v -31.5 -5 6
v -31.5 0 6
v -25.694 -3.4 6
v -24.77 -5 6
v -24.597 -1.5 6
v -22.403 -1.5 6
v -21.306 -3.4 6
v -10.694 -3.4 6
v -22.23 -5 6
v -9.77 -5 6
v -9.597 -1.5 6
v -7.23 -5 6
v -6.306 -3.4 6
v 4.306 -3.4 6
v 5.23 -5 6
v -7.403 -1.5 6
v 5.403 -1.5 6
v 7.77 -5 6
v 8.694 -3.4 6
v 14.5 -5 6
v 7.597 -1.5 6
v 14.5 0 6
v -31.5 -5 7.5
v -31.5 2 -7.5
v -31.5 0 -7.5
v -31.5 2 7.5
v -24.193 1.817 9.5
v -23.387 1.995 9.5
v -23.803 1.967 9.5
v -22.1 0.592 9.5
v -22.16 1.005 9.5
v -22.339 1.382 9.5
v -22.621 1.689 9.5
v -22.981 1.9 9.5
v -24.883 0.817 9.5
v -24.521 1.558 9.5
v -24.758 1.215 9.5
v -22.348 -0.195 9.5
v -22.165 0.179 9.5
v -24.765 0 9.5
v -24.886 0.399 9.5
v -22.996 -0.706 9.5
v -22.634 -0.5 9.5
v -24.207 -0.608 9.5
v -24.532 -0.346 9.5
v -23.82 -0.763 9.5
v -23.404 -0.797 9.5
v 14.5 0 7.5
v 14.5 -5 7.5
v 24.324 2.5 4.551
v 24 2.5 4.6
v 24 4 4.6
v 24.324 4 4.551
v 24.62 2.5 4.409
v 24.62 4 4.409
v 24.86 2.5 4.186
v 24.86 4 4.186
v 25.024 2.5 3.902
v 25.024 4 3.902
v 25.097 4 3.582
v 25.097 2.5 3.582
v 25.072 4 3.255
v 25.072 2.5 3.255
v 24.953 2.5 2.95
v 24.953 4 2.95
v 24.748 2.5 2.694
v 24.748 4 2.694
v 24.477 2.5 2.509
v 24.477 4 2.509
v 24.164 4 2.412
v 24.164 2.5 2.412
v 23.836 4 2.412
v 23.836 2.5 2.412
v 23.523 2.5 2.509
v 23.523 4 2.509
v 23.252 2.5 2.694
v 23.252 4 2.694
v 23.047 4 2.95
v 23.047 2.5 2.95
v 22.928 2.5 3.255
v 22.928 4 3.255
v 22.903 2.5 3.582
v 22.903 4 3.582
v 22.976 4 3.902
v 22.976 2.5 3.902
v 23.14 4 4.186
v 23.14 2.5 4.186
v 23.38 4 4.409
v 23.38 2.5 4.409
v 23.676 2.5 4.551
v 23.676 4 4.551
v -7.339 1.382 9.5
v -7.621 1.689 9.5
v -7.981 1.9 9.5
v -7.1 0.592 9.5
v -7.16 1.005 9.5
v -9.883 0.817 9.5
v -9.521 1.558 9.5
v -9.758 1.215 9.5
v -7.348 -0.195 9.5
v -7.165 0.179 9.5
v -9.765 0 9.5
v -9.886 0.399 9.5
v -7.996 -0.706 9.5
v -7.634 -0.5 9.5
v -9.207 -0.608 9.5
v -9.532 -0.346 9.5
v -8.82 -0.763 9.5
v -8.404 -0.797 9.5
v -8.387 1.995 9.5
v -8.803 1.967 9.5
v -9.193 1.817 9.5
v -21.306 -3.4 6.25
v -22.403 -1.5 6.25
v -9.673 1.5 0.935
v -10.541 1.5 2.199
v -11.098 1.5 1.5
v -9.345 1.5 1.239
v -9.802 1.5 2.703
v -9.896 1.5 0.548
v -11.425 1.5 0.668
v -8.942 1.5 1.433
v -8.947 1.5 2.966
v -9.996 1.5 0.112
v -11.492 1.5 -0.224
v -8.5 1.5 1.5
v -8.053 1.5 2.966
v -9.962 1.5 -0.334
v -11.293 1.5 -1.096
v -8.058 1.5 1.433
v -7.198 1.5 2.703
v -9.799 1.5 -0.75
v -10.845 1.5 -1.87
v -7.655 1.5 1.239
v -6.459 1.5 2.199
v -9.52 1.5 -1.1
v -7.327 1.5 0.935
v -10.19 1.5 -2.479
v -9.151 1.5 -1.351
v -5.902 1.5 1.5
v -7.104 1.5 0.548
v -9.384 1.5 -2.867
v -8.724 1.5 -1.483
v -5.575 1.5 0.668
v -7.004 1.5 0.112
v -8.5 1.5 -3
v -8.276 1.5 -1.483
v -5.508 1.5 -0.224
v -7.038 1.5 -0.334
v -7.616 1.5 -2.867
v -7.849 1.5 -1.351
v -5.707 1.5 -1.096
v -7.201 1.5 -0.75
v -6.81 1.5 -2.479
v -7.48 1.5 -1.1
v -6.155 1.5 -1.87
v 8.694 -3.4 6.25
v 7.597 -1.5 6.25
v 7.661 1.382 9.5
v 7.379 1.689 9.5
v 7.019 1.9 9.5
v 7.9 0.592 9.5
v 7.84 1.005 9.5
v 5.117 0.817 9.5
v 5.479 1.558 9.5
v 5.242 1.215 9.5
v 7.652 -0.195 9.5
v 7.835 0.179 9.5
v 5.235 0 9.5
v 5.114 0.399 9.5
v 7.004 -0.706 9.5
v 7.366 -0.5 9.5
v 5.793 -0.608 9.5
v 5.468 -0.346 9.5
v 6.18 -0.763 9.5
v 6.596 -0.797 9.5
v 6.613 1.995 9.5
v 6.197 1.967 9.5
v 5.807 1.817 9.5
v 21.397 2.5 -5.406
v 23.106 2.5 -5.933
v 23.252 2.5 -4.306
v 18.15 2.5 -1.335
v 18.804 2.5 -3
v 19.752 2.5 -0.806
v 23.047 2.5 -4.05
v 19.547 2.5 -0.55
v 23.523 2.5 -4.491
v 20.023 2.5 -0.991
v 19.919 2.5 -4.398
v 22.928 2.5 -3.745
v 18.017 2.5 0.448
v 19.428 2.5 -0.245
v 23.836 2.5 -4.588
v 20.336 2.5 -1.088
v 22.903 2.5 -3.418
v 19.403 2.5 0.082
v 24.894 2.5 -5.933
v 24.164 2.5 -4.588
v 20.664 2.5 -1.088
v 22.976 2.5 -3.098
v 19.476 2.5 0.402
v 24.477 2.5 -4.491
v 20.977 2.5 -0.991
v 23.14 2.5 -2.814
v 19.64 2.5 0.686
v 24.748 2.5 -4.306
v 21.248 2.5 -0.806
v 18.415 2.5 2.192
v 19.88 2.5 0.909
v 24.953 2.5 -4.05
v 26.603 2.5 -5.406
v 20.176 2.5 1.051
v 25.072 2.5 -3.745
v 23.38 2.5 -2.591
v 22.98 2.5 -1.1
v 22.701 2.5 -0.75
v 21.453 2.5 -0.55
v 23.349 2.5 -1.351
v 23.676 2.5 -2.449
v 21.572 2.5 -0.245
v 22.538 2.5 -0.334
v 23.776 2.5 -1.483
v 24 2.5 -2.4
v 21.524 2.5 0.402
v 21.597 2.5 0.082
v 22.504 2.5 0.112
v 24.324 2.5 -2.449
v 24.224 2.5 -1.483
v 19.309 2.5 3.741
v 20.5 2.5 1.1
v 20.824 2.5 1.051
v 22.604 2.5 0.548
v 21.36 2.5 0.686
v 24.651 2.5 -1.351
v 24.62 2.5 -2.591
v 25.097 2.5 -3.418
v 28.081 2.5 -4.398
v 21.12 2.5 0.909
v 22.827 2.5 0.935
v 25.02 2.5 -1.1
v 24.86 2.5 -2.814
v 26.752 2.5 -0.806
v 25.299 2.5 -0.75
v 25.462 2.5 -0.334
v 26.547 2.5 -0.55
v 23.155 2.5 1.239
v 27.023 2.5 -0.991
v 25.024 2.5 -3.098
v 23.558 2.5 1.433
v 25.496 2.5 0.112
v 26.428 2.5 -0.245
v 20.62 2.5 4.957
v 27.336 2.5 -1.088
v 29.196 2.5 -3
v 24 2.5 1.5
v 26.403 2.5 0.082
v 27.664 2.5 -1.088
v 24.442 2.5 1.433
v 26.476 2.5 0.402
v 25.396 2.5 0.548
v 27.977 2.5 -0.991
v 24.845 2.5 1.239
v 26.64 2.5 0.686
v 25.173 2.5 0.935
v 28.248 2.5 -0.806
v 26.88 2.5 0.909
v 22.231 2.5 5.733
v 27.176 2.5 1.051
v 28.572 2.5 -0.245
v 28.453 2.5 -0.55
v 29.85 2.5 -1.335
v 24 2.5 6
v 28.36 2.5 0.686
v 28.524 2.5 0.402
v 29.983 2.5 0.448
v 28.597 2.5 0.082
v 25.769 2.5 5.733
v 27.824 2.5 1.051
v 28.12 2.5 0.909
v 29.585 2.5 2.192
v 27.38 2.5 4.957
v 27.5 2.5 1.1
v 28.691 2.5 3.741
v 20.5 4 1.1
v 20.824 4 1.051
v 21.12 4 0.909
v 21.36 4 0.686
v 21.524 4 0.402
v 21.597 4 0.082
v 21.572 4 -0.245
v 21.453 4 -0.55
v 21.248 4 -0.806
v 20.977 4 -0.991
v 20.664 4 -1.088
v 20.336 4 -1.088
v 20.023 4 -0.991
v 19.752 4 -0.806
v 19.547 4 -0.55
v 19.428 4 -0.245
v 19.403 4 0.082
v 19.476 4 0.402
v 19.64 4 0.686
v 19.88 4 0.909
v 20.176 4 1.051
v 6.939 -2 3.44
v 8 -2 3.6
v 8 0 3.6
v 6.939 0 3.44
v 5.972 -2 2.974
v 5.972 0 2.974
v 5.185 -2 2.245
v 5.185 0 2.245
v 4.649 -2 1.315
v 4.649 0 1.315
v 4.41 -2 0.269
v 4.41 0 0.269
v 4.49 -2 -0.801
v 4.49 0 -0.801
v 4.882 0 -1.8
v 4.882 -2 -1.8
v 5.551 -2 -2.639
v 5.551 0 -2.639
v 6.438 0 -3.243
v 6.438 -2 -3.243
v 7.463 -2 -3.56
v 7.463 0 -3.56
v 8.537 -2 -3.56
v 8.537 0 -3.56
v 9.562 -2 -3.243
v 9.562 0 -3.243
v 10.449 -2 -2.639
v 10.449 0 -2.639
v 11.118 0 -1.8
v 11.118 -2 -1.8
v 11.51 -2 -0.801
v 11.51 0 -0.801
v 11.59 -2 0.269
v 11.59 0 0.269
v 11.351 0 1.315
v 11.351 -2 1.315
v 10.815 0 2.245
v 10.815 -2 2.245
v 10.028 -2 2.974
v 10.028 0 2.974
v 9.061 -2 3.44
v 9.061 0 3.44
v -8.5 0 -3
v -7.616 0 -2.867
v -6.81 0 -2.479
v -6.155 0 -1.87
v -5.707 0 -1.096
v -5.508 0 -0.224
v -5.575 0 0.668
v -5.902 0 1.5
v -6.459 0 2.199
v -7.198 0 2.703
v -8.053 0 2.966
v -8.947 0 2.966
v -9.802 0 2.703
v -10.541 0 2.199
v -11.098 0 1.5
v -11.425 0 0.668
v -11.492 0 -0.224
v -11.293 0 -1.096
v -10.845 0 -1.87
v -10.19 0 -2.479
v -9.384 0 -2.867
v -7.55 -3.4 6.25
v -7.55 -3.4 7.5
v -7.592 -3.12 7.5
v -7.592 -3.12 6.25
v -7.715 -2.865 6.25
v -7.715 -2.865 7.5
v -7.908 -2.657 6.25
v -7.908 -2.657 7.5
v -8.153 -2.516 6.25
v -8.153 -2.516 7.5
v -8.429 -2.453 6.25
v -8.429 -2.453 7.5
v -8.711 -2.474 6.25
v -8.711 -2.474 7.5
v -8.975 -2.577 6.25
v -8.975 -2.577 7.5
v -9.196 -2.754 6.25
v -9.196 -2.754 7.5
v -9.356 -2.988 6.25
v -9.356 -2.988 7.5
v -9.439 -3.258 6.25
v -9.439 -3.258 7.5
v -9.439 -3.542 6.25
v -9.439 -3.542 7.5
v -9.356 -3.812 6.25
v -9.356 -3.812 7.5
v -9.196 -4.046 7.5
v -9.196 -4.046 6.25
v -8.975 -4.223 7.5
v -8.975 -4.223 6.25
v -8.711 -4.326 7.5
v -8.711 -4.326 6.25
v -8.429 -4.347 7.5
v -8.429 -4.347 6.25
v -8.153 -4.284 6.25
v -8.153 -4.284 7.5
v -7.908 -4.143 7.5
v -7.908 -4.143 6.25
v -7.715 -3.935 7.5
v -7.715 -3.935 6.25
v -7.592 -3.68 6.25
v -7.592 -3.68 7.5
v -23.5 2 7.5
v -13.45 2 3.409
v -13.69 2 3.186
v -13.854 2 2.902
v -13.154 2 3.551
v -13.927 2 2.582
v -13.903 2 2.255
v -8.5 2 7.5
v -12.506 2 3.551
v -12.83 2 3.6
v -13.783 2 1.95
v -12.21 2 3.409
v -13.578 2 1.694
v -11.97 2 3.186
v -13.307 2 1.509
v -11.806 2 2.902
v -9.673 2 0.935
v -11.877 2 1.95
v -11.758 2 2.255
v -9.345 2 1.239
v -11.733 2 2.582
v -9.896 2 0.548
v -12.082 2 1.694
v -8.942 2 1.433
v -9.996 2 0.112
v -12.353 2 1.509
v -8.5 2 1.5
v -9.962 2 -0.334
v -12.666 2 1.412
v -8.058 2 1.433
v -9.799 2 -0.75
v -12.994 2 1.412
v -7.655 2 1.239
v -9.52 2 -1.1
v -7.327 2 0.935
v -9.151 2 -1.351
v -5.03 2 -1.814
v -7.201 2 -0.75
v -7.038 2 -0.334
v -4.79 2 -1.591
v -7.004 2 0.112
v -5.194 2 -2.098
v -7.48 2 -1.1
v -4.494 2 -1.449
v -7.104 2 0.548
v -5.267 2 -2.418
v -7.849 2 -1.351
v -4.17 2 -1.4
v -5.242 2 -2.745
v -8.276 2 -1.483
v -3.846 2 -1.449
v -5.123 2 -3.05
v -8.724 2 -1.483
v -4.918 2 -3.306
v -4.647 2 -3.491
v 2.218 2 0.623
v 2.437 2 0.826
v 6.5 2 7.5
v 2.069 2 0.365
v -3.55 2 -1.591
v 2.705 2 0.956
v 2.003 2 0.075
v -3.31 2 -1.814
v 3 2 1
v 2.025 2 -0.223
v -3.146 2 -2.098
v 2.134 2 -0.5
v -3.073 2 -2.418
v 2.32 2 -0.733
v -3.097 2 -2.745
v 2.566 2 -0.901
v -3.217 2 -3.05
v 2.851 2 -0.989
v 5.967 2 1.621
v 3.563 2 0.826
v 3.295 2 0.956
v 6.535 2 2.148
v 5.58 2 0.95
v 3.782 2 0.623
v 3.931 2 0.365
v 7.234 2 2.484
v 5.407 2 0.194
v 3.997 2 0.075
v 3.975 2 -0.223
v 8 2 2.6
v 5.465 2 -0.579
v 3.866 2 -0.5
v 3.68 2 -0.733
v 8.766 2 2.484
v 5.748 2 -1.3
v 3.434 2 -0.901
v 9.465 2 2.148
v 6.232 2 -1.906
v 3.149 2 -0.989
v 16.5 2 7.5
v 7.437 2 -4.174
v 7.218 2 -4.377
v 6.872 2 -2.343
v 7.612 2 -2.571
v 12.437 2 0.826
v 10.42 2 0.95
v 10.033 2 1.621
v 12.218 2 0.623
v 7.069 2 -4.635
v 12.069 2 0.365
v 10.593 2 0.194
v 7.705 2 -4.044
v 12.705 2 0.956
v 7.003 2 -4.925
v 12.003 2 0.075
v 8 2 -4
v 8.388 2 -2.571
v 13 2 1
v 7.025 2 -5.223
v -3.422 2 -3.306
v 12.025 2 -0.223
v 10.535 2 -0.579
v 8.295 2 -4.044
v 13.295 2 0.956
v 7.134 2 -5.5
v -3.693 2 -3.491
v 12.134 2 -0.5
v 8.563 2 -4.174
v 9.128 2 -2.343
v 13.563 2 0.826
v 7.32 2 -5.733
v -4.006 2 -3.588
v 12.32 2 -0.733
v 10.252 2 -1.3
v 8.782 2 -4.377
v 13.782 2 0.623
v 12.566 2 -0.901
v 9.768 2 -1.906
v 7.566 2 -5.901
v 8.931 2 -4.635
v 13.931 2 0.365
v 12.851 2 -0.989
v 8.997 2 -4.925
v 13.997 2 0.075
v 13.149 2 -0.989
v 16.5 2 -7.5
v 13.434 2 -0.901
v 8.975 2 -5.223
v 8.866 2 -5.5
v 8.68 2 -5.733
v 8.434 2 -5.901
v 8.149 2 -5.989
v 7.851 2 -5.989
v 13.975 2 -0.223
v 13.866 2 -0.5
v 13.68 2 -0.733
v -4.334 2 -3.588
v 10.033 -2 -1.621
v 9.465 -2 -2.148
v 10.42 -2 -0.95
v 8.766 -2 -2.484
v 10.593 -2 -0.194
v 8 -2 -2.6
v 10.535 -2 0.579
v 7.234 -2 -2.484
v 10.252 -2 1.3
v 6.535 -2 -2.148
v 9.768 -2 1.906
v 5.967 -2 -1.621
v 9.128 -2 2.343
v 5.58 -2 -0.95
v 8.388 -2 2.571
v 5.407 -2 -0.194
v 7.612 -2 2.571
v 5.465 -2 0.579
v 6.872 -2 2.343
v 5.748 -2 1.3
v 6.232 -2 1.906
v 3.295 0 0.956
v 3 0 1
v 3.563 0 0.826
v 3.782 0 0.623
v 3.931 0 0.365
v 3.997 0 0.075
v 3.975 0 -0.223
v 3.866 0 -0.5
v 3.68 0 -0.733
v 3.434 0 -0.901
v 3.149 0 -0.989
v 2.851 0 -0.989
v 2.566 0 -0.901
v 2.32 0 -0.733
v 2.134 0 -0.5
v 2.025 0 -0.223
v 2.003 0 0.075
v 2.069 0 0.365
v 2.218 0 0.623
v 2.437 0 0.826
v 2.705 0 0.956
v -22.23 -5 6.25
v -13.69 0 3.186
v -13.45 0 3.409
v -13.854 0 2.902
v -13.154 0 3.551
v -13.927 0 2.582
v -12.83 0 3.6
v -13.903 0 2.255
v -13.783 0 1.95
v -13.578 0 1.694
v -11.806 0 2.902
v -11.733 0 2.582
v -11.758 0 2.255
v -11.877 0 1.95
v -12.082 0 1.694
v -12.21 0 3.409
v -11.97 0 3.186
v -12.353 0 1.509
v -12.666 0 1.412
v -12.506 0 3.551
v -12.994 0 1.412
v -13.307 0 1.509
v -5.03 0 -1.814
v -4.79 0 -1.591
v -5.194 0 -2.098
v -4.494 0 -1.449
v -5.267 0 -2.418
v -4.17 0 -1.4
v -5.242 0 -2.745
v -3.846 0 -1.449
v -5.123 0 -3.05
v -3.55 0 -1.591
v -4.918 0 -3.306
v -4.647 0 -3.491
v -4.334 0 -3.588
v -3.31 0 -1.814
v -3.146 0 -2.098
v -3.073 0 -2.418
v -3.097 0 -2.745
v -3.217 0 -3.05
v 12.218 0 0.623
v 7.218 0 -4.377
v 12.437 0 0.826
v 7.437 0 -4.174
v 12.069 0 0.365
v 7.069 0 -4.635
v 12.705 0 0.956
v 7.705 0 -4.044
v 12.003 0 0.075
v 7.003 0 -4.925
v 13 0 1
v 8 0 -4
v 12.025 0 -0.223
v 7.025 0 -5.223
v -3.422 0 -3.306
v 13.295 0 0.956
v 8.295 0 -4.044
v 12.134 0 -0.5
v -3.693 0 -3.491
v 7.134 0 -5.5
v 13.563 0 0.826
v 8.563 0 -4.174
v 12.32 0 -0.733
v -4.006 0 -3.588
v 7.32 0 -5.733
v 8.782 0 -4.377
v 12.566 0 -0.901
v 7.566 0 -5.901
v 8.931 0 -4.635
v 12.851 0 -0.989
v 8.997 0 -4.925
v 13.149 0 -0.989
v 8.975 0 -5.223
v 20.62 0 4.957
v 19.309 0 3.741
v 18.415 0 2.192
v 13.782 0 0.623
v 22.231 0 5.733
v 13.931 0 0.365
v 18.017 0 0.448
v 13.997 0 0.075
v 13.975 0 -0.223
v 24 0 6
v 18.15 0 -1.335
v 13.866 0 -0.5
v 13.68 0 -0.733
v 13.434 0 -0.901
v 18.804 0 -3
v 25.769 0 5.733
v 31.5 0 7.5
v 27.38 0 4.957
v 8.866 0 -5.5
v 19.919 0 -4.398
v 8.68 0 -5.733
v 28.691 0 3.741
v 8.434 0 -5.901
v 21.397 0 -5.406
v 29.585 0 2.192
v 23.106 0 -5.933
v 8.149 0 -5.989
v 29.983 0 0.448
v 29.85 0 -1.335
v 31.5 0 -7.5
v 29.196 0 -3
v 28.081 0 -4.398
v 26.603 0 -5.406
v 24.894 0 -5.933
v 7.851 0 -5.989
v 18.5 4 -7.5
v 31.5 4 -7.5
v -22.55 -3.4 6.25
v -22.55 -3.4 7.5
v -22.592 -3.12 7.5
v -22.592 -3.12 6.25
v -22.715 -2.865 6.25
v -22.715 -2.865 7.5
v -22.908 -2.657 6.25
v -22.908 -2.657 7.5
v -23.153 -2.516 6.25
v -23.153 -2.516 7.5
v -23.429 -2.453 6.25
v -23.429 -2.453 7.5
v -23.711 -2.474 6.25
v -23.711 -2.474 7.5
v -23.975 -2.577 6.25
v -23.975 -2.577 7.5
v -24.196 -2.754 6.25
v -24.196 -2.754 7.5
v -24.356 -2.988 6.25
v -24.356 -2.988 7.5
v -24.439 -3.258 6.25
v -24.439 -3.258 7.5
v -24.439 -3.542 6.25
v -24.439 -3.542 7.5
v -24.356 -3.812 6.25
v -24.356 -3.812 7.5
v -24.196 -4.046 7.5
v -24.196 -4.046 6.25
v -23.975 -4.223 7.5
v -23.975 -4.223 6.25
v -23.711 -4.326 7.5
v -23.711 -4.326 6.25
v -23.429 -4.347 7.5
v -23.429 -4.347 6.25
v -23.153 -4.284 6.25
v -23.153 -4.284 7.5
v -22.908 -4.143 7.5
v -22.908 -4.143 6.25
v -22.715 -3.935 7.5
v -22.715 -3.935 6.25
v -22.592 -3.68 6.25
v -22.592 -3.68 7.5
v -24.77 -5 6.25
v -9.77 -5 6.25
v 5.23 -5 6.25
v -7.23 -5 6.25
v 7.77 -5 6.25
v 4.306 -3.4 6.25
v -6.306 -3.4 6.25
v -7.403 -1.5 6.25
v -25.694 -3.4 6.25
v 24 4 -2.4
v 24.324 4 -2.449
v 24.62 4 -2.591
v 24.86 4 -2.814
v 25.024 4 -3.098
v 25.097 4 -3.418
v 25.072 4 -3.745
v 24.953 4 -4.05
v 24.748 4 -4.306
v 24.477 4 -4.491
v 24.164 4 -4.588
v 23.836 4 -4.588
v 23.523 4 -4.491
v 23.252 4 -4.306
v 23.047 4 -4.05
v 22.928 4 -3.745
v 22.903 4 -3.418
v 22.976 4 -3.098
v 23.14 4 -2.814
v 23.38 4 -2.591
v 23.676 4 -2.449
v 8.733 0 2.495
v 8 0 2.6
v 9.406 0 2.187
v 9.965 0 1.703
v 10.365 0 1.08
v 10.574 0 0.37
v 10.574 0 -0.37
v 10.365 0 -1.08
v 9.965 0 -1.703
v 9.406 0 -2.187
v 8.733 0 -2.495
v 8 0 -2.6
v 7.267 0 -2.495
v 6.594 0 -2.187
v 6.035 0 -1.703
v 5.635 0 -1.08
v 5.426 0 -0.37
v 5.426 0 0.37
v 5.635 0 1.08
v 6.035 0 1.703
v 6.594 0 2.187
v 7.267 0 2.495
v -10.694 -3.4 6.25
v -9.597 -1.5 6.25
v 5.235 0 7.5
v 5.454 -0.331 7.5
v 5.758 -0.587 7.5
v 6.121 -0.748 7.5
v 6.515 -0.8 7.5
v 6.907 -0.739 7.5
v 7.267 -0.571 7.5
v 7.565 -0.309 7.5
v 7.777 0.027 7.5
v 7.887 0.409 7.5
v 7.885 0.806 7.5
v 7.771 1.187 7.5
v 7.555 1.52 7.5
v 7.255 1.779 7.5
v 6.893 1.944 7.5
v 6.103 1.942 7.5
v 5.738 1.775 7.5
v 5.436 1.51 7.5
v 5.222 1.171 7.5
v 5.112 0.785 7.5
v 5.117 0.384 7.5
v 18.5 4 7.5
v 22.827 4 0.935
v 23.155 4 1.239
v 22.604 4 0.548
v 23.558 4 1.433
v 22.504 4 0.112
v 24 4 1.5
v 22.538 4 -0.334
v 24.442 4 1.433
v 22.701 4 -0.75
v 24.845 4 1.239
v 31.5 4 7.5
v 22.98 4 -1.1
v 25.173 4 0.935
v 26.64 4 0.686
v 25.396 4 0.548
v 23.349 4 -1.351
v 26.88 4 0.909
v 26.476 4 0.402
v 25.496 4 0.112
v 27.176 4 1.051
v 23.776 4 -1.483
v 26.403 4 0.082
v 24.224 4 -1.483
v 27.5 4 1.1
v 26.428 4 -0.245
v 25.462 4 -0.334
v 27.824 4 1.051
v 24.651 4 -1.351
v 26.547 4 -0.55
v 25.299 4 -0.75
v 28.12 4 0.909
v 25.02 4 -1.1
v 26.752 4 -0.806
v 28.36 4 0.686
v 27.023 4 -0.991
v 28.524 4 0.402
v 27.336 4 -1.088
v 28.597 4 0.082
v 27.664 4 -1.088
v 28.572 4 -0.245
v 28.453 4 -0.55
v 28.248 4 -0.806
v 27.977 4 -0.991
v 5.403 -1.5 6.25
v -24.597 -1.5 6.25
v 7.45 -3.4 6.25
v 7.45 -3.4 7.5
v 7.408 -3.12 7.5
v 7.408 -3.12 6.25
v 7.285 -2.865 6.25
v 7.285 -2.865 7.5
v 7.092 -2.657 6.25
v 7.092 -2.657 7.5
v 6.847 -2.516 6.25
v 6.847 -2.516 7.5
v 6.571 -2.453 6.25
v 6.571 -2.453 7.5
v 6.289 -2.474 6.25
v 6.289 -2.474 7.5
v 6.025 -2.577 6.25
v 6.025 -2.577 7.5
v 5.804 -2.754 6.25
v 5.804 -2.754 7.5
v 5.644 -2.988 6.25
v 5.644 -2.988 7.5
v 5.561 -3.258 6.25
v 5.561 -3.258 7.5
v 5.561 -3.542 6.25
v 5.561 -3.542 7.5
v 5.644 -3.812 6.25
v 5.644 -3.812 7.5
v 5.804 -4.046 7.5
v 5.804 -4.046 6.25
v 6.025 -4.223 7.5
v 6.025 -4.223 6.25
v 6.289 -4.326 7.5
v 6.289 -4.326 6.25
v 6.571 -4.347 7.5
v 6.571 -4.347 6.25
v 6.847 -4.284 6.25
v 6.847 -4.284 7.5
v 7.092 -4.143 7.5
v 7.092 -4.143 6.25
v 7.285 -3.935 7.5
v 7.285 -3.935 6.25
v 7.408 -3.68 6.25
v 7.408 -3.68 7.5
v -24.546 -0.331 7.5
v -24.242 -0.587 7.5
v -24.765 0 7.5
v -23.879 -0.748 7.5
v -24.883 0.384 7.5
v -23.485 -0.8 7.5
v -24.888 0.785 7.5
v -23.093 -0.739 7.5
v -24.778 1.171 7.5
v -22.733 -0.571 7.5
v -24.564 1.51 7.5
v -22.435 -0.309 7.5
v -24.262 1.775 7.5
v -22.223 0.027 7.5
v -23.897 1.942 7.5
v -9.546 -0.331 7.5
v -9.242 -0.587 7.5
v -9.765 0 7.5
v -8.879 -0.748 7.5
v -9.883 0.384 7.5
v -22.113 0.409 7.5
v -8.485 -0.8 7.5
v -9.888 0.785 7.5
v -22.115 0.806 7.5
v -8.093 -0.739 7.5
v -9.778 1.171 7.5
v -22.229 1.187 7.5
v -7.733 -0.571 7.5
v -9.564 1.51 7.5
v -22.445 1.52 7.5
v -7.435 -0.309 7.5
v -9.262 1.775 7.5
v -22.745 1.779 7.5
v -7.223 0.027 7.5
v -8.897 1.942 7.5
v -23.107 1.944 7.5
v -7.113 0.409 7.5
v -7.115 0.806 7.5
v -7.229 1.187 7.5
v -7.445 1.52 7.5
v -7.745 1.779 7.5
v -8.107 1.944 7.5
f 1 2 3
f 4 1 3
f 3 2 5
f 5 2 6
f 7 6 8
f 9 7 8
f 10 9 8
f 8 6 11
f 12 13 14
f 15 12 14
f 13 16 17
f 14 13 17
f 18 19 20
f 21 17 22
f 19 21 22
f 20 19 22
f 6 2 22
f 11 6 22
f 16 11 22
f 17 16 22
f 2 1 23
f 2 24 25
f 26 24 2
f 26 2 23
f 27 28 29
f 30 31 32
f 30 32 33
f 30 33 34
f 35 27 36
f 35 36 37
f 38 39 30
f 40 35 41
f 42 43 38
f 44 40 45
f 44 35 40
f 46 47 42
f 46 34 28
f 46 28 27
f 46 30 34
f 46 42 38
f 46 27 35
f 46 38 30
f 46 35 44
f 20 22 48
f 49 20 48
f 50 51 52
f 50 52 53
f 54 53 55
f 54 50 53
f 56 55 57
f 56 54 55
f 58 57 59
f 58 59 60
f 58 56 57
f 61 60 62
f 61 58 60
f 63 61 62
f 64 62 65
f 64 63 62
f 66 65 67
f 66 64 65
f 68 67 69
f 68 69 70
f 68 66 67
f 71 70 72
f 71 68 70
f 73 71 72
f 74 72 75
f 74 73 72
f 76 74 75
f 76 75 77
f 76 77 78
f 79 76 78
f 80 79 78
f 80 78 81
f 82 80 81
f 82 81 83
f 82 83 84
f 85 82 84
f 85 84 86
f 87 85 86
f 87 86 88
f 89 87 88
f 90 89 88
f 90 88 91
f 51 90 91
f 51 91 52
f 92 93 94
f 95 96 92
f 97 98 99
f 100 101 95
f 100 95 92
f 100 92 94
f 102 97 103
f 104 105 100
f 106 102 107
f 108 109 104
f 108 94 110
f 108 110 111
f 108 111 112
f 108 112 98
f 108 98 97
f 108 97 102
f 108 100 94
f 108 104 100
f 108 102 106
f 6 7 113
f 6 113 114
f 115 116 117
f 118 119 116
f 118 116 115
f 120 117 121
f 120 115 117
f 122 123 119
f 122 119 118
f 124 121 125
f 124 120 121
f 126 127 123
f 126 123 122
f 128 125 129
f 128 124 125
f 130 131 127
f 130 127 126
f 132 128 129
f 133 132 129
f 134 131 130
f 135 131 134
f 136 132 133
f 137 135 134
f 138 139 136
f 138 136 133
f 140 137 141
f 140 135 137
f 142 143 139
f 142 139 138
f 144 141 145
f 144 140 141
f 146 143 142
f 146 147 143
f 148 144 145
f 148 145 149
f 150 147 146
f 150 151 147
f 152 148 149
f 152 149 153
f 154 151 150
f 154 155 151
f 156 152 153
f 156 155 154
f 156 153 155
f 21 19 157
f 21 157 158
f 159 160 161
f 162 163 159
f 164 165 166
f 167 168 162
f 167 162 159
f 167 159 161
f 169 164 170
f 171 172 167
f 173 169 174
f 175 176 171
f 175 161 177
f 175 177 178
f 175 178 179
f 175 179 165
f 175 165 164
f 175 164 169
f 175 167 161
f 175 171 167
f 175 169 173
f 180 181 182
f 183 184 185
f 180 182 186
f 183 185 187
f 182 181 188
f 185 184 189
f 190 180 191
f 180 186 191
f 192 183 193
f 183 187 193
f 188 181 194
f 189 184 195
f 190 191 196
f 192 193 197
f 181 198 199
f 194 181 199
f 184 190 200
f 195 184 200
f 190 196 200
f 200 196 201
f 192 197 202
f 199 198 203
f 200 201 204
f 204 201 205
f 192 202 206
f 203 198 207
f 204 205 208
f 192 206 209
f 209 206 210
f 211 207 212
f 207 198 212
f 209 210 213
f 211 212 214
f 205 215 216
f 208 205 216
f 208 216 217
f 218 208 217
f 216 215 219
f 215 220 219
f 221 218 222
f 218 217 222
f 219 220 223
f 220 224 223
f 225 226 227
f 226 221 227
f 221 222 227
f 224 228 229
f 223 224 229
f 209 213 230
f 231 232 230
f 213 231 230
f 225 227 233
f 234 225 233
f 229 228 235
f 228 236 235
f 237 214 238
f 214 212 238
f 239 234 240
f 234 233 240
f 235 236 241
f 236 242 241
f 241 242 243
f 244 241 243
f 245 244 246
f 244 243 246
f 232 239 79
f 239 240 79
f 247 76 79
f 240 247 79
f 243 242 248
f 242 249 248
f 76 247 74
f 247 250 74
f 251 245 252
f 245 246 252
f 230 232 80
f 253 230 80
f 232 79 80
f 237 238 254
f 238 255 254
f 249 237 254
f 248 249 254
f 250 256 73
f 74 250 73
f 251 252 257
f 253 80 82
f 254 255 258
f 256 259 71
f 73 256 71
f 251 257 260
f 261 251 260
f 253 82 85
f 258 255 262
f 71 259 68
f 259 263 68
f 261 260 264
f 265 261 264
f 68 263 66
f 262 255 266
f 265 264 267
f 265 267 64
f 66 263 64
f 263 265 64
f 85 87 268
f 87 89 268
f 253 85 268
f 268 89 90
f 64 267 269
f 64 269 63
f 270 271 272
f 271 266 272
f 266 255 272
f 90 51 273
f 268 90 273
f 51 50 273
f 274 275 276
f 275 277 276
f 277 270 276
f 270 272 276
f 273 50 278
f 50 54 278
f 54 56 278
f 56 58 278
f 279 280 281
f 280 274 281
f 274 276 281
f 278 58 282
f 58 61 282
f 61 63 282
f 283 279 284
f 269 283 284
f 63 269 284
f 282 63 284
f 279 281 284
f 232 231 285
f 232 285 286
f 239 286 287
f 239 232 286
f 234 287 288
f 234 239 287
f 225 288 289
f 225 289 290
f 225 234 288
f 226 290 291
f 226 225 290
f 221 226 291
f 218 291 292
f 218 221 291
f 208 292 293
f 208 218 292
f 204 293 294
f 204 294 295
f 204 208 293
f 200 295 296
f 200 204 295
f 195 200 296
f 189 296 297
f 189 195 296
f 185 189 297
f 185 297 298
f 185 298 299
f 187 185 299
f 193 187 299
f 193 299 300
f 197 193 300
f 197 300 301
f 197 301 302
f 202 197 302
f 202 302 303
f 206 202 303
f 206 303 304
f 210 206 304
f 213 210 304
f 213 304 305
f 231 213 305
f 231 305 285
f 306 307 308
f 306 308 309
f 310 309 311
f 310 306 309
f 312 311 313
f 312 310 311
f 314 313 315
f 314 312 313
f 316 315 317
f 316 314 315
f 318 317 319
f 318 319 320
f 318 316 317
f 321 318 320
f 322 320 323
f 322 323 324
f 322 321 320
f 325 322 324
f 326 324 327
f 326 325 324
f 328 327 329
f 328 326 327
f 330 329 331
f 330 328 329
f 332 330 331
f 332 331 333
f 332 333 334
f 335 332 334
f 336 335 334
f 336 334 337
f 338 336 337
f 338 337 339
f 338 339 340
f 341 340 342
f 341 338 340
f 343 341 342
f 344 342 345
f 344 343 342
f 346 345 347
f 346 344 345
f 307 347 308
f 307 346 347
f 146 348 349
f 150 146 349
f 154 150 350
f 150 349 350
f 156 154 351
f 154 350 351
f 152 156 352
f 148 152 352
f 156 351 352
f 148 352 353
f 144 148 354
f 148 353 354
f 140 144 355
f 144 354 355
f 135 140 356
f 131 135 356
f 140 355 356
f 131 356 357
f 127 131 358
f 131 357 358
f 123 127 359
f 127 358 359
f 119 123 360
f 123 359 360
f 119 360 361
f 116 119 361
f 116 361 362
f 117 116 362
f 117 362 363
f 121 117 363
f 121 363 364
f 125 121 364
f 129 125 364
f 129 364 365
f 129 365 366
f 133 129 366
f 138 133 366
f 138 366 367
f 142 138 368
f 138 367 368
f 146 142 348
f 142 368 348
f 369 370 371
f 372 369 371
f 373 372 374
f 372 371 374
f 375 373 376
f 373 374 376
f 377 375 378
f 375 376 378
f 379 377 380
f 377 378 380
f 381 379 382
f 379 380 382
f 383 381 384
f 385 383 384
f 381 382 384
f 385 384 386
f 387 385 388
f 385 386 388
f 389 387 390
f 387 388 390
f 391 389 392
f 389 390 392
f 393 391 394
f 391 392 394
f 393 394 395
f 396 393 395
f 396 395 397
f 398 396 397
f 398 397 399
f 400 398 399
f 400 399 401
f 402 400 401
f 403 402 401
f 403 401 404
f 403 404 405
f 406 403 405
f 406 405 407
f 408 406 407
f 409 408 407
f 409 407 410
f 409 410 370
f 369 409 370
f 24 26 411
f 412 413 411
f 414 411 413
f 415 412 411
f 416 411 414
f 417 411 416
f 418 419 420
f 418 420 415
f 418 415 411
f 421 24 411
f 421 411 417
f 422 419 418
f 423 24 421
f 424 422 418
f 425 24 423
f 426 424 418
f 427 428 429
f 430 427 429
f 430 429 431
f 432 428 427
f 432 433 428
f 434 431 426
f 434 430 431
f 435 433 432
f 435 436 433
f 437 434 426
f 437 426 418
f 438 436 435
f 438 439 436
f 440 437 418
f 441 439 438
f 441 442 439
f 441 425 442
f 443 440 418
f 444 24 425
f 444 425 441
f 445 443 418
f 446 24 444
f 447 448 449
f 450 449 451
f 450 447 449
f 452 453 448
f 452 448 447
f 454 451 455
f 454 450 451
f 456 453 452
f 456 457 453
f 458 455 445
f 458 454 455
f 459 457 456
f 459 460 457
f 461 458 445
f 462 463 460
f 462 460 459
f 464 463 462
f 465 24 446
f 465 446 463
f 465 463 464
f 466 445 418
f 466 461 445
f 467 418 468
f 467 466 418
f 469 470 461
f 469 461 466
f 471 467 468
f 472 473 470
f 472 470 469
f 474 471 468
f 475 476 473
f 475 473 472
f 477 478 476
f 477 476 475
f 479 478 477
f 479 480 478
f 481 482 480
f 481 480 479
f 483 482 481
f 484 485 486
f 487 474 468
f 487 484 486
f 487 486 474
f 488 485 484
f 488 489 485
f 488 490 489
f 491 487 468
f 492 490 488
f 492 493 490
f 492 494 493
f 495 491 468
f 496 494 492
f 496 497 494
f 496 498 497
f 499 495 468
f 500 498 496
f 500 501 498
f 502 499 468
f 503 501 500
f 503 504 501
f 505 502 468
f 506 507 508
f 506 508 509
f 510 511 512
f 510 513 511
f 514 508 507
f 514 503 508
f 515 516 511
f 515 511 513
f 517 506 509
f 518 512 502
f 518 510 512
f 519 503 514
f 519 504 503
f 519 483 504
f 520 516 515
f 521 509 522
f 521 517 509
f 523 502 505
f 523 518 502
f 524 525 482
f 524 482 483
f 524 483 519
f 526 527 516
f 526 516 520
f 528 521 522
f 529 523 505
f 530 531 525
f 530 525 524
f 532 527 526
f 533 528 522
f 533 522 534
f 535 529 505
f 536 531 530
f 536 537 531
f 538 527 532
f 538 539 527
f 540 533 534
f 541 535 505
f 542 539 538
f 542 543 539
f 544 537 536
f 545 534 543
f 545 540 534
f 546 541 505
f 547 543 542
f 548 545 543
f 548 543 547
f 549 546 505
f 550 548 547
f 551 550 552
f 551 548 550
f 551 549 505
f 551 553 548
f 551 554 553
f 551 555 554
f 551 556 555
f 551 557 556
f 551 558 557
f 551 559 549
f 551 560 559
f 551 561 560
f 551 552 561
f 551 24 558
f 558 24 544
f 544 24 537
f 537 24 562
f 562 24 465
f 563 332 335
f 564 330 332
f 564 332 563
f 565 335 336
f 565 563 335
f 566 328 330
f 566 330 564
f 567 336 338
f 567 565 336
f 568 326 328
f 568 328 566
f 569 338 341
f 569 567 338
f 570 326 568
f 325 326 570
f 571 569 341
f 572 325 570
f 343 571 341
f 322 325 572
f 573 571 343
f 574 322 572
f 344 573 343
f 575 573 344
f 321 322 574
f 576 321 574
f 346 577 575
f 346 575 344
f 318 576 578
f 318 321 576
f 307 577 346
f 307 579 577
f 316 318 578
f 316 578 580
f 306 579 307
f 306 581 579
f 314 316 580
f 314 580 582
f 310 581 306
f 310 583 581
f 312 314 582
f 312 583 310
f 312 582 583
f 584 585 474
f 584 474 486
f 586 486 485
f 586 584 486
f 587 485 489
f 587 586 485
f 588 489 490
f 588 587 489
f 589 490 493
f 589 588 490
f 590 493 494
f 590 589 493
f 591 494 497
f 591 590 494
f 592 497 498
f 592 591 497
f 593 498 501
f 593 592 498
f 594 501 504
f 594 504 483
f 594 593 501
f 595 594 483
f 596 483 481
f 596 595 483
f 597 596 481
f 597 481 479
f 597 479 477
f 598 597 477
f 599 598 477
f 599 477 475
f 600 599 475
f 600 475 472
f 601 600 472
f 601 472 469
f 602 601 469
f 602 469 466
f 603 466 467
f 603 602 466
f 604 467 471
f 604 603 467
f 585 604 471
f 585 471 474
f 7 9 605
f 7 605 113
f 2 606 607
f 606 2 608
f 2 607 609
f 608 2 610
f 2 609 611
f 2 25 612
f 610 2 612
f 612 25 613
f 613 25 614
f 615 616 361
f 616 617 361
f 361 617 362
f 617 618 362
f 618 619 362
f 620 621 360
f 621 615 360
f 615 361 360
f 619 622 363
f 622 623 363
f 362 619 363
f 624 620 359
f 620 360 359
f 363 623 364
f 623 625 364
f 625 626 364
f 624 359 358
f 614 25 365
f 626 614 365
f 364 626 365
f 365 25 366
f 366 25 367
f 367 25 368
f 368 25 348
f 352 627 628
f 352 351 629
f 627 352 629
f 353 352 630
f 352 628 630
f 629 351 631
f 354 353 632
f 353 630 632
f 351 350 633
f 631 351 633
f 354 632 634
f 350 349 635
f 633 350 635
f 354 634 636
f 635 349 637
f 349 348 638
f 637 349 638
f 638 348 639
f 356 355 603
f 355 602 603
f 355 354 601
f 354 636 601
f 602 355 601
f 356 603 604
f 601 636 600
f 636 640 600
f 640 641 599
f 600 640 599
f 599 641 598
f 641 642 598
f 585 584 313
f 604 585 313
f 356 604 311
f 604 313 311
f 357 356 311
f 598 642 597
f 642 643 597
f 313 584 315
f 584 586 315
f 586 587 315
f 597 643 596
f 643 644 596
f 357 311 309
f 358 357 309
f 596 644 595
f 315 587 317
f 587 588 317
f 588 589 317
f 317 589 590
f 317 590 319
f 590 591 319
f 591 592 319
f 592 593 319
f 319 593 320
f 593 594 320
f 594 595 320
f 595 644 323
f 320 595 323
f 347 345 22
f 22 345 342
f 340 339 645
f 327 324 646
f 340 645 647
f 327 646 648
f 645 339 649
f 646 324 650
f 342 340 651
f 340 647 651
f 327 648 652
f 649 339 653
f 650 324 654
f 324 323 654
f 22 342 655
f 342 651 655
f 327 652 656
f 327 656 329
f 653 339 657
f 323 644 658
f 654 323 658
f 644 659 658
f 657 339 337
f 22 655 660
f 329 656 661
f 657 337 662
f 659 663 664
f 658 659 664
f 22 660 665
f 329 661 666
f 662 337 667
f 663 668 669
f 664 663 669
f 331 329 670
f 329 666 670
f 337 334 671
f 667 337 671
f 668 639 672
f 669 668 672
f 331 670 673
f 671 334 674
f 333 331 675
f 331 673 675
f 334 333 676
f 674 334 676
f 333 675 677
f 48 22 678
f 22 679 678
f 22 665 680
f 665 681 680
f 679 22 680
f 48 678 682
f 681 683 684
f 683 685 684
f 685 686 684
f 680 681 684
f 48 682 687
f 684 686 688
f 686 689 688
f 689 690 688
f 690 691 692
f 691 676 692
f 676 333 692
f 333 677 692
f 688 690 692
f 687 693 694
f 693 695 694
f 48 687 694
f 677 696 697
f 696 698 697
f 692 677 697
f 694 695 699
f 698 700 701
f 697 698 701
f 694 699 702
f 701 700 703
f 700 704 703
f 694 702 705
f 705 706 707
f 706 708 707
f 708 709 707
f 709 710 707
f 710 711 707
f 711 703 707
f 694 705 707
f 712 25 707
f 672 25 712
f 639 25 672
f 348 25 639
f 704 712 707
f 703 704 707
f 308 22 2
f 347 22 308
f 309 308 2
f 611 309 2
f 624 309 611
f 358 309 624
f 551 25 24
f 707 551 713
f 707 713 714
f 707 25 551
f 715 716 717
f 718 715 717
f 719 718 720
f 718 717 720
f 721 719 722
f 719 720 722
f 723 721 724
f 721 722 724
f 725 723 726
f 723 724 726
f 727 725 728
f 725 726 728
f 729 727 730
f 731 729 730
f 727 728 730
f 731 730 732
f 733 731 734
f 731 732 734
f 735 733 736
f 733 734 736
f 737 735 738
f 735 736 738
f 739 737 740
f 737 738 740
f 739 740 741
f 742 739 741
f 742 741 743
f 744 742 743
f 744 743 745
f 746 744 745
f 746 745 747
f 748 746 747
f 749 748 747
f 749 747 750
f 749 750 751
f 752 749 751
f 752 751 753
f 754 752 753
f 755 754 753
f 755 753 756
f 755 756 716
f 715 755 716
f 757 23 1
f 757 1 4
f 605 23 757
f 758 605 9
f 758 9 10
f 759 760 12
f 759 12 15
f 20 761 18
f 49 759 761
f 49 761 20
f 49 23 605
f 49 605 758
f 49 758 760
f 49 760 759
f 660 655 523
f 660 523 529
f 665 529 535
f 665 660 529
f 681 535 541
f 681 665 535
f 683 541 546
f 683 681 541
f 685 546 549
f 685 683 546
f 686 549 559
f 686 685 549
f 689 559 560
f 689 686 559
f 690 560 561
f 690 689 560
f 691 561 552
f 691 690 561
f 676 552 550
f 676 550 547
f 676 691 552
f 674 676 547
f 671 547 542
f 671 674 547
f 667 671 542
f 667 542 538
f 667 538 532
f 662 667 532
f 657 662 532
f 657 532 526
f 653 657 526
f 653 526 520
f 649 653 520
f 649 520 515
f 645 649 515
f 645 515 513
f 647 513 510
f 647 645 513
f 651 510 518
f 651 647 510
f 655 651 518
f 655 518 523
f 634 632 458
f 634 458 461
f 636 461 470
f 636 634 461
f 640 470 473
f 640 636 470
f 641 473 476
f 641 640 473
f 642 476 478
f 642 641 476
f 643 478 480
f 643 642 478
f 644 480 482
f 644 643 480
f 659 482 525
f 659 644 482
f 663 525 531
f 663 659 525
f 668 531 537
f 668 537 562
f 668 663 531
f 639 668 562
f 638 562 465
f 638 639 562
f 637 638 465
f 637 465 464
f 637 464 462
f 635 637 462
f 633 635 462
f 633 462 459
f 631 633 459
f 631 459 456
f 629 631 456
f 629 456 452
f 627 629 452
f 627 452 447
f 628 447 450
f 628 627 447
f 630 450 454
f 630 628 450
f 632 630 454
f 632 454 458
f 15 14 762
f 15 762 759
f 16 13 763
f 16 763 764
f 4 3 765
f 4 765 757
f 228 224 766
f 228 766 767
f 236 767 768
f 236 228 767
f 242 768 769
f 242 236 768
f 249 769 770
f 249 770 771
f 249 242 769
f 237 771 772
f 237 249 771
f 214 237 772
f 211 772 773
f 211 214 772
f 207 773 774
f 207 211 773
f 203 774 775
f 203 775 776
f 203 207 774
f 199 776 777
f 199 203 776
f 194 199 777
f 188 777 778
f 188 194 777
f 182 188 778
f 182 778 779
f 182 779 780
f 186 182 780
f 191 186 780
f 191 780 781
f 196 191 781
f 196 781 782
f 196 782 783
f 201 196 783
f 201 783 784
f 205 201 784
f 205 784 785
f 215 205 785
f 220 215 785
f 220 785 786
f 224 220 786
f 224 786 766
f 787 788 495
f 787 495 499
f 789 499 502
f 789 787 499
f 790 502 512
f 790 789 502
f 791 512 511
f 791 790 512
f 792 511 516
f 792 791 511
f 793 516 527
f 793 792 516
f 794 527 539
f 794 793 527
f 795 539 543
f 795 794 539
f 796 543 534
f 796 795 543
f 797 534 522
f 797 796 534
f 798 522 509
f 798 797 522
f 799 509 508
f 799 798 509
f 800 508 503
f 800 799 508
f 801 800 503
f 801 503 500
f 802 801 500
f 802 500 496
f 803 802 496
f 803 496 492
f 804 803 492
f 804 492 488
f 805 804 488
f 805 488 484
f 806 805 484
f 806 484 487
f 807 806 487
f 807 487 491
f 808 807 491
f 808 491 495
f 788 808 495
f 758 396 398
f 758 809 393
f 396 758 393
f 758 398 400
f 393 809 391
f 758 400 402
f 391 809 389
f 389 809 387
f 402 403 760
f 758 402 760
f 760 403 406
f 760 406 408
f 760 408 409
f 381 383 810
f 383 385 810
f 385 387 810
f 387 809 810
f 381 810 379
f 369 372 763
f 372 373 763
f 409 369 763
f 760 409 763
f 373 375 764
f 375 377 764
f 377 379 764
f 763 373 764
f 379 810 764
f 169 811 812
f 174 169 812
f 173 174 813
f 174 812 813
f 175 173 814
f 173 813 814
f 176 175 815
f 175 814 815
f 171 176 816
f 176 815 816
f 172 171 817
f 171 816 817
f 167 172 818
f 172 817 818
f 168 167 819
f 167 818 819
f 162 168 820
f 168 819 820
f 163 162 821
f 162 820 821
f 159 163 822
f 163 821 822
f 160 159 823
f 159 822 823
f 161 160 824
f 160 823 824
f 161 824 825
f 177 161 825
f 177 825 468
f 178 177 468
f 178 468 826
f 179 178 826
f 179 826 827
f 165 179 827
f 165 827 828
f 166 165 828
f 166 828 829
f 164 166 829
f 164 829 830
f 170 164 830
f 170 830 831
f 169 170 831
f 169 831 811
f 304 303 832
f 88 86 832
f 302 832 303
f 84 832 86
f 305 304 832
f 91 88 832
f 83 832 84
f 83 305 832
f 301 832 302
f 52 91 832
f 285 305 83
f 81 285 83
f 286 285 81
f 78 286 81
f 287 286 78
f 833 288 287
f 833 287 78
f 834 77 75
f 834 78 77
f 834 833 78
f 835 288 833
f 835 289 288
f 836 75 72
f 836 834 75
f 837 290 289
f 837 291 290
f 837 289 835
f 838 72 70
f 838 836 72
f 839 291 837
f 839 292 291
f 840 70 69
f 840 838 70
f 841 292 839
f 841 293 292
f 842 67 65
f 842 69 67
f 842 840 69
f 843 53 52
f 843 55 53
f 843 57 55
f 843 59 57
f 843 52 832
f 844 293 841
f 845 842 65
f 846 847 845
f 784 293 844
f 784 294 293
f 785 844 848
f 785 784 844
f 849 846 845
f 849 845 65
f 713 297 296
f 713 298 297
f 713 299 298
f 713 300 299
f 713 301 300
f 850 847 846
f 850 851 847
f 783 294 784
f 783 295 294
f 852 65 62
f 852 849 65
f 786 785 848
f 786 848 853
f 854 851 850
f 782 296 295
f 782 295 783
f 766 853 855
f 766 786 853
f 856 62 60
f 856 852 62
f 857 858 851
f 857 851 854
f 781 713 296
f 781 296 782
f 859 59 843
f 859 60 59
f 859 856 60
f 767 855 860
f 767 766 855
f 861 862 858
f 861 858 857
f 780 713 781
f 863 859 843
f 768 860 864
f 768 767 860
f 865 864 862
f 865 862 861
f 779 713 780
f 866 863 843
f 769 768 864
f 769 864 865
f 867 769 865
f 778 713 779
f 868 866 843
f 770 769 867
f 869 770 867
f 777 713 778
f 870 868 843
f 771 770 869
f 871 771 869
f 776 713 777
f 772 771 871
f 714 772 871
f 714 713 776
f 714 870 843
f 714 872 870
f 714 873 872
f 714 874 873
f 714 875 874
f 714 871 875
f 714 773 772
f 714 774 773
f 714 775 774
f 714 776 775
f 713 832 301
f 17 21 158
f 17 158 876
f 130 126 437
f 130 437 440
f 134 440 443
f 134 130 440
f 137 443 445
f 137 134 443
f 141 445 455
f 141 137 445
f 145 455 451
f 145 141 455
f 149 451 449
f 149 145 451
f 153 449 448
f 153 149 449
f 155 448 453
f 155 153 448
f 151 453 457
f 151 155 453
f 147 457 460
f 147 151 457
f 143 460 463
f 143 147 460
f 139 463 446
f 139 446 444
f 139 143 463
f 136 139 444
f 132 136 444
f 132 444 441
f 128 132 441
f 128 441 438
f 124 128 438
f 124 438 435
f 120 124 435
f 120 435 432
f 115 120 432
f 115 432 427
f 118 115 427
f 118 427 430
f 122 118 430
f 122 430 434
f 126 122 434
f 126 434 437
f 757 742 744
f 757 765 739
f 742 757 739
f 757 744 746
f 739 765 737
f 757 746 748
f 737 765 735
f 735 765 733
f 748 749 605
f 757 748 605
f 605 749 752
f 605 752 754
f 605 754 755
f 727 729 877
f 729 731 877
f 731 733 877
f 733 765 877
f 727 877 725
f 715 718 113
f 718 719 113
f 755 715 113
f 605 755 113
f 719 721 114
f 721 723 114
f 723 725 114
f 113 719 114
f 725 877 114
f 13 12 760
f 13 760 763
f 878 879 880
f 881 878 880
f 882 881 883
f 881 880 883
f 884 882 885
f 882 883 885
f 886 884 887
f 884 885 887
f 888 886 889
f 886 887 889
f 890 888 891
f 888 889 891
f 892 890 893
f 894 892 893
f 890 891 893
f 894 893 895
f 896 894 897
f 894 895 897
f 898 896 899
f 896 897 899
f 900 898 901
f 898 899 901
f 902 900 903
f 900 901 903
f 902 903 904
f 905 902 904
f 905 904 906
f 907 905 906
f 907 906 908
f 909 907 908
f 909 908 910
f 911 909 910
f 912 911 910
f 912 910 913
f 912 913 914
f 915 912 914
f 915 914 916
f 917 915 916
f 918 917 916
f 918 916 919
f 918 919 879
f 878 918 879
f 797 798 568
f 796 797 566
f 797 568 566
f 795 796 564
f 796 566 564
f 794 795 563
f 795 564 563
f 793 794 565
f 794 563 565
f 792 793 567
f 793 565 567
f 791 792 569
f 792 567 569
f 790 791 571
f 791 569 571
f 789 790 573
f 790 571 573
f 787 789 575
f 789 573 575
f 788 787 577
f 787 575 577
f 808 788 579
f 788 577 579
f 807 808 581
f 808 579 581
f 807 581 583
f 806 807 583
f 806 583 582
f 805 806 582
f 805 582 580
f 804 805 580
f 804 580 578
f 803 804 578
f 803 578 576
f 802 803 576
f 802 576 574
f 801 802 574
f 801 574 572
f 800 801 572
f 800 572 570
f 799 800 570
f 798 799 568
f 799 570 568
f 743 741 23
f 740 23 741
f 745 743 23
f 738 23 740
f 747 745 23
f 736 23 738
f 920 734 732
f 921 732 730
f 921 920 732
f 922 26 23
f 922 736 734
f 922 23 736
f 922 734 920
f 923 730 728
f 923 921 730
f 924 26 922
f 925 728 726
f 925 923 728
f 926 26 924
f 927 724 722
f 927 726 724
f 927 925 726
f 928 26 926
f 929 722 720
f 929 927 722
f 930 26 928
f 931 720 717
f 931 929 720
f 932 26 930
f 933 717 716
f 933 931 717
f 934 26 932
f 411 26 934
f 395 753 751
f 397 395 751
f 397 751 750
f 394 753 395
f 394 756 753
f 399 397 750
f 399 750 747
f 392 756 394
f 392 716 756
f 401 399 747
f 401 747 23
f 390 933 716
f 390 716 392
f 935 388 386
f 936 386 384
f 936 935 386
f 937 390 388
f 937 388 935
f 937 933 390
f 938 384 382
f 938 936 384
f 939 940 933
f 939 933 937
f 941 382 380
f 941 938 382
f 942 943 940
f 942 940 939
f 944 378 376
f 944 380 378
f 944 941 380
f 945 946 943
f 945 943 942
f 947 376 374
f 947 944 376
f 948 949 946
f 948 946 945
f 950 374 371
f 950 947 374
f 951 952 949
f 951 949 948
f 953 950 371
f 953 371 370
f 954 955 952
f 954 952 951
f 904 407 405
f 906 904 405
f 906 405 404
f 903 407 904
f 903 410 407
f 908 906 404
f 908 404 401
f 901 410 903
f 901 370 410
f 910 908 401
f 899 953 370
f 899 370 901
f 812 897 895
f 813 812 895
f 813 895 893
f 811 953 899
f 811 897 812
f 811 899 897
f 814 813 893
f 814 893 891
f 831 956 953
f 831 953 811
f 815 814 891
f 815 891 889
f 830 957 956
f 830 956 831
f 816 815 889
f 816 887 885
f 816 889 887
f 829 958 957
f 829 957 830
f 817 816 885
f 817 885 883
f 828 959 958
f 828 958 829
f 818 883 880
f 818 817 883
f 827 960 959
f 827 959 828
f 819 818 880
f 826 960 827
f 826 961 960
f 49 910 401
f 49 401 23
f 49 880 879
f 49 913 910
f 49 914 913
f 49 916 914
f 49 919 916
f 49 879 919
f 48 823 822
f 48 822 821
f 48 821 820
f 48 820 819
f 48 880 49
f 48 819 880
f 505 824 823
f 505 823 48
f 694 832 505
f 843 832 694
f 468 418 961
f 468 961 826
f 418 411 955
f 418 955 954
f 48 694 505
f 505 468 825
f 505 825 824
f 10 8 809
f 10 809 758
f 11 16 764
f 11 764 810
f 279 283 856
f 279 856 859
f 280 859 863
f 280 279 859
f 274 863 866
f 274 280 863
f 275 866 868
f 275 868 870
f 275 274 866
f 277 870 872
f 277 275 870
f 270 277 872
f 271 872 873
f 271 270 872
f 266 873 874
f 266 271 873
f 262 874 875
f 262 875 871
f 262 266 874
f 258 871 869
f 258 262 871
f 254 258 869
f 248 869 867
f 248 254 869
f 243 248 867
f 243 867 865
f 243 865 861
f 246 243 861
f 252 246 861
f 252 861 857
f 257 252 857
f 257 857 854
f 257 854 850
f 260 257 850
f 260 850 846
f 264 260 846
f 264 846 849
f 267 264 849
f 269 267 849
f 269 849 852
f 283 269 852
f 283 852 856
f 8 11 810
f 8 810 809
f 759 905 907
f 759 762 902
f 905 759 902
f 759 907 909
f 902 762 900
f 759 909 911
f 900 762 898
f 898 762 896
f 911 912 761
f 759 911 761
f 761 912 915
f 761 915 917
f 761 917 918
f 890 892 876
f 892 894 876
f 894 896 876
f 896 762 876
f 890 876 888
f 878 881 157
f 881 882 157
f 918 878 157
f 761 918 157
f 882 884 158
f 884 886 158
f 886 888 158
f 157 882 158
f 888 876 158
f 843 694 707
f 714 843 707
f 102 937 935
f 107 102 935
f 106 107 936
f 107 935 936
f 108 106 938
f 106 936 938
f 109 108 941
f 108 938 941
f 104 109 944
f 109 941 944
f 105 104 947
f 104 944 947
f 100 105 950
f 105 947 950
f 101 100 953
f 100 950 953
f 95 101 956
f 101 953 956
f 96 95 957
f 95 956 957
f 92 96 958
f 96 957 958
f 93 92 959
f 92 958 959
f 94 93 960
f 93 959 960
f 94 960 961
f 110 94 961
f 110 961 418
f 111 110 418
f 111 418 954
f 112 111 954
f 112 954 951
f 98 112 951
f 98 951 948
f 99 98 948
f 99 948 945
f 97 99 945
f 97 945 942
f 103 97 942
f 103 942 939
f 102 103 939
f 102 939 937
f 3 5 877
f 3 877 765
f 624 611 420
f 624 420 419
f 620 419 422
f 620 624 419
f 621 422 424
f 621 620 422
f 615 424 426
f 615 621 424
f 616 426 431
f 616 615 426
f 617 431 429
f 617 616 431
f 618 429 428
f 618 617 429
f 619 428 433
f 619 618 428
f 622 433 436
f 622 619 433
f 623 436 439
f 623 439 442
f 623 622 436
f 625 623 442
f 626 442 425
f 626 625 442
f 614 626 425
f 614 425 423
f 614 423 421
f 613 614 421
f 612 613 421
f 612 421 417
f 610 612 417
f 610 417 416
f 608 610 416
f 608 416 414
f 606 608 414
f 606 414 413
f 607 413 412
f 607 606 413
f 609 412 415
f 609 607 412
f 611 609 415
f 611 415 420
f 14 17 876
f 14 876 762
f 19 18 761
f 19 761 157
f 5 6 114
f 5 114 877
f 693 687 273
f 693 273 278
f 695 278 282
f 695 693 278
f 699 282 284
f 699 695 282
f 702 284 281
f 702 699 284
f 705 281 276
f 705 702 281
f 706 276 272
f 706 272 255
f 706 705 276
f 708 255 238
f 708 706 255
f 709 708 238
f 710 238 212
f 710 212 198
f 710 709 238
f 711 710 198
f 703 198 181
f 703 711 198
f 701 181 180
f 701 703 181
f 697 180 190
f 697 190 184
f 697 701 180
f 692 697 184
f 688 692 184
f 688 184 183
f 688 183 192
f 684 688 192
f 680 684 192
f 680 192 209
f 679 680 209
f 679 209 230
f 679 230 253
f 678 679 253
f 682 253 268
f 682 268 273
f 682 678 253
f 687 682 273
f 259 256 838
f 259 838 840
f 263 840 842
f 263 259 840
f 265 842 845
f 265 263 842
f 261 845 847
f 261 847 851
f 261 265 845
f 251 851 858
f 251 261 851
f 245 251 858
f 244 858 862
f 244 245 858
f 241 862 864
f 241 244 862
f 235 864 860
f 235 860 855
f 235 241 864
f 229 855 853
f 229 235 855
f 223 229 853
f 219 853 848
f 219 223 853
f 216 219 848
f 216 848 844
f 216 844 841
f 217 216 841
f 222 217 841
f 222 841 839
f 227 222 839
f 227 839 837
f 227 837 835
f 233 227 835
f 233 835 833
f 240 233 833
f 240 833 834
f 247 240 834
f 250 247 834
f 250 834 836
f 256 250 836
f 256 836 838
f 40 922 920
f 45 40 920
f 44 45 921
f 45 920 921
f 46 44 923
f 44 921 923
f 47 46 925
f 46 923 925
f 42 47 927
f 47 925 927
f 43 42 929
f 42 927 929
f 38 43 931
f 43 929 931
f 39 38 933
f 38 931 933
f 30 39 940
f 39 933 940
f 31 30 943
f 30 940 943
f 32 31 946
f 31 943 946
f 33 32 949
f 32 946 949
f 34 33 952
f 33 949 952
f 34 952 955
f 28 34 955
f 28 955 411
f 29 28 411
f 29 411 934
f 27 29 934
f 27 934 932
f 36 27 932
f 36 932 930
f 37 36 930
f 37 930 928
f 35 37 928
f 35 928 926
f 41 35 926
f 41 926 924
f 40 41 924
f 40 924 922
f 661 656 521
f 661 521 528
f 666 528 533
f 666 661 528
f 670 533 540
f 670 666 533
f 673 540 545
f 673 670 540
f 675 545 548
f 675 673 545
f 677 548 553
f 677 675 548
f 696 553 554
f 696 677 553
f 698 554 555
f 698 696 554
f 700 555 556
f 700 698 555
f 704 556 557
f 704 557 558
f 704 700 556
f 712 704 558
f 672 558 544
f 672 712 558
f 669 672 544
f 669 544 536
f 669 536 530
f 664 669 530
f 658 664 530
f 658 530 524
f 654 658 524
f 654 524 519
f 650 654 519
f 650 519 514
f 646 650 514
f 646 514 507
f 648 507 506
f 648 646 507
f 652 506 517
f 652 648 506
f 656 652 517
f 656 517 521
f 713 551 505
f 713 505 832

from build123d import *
from build123d.topology import SkipClean

# Parameters (mm, degrees)
SKETCH_1_W          = 63
SKETCH_1_H          = 15
SKETCH_1_R          = 1.5
SKETCH_1_R_2        = 1.1
SKETCH_1_R_3        = 2.6
SKETCH_1_R_4        = 1
EXTRUDE_1_DEPTH     = 2
SKETCH_2_R          = 1.4
EXTRUDE_2_DEPTH     = 2
SKETCH_3_R          = 3
CUT_EXTRUDE_1_DEPTH = 1.5
SKETCH_4_W          = 46
SKETCH_4_H          = 1.5
EXTRUDE_3_DEPTH     = 5
SKETCH_2_3_R        = 0.95
CUT_EXTRUDE_2_DEPTH = 1.5
CUT_EXTRUDE_3_DEPTH = 0.25
SKETCH_1_7_W        = 15
SKETCH_1_7_H        = 15
SKETCH_1_7_R        = 1.5
SKETCH_1_7_R_2      = 1.1
EXTRUDE_4_DEPTH     = 4
SKETCH_1_8_R        = 6
SKETCH_1_8_R_2      = 1.5
SKETCH_1_8_R_3      = 1.1
CUT_EXTRUDE_4_DEPTH = 2.5
CUT_EXTRUDE_5_DEPTH = 15
EXTRUDE_START       = 2
SKETCH_8_R          = 3.6
SKETCH_8_R_2        = 2.6
EXTRUDE_5_DEPTH     = 2


with BuildPart() as part:
    # 草图1 → 凸台-拉伸1 (new body)
    with BuildSketch(Plane(origin=(0, 0, 0), x_dir=(1, 0, 0), z_dir=(0, 1, 0))):
        Rectangle(SKETCH_1_W, SKETCH_1_H)
        with Locations(Location((-8.5, 0, 0), (0, 0, 270))):
            Circle(SKETCH_1_R, mode=Mode.SUBTRACT)
        with Locations(Location((-4.169872981, 2.5, 0), (0, 0, 270))):
            Circle(SKETCH_1_R_2, mode=Mode.SUBTRACT)
        with Locations(Location((-12.830127019, -2.5, 0), (0, 0, 270))):
            Circle(SKETCH_1_R_2, mode=Mode.SUBTRACT)
        with Locations(Location((8, 0, 0), (0, 0, 270))):
            Circle(SKETCH_1_R_3, mode=Mode.SUBTRACT)
        with Locations(Location((24, 0, 0), (0, 0, 270))):
            Circle(SKETCH_1_R, mode=Mode.SUBTRACT)
        with Locations(Location((27.5, 0, 0), (0, 0, 270))):
            Circle(SKETCH_1_R_2, mode=Mode.SUBTRACT)
        with Locations(Location((24, -3.5, 0), (0, 0, 270))):
            Circle(SKETCH_1_R_2, mode=Mode.SUBTRACT)
        with Locations(Location((20.5, 0, 0), (0, 0, 270))):
            Circle(SKETCH_1_R_2, mode=Mode.SUBTRACT)
        with Locations(Location((24, 3.5, 0), (0, 0, 270))):
            Circle(SKETCH_1_R_2, mode=Mode.SUBTRACT)
        with Locations(Location((13, 0, 0), (0, 0, 270))):
            Circle(SKETCH_1_R_4, mode=Mode.SUBTRACT)
        with Locations(Location((3, 0, 0), (0, 0, 270))):
            Circle(SKETCH_1_R_4, mode=Mode.SUBTRACT)
        with Locations(Location((8, 5, 0), (0, 0, 270))):
            Circle(SKETCH_1_R_4, mode=Mode.SUBTRACT)
    extrude(amount=EXTRUDE_1_DEPTH)

    # 草图2 → 凸台-拉伸2 (add)
    with BuildSketch(Plane.XY.offset(7.5)):
        with Locations(Location((-23.5, 0.6, 0), (0, 0, 205.376933525))):
            Circle(SKETCH_2_R)
        with Locations(Location((-8.5, 0.6, 0), (0, 0, 205.376933525))):
            Circle(SKETCH_2_R)
        with Locations(Location((6.5, 0.6, 0), (0, 0, 205.376933525))):
            Circle(SKETCH_2_R)
    extrude(amount=EXTRUDE_2_DEPTH)

    # 草图3 → 切除-拉伸1 (cut)
    with BuildSketch(Plane.XZ):
        with Locations(Location((-8.5, 0, 0), (0, 0, 270))):
            Circle(SKETCH_3_R)
    extrude(amount=-CUT_EXTRUDE_1_DEPTH, mode=Mode.SUBTRACT)

    # 草图4 → 凸台-拉伸3 (add)
    with BuildSketch(Plane.XZ):
        with Locations((-8.5, 6.75)):
            Rectangle(SKETCH_4_W, SKETCH_4_H)
    extrude(amount=EXTRUDE_3_DEPTH)

    # 草图2<3> → 切除-拉伸2 (cut)
    with BuildSketch(Plane.XY.offset(7.5)):
        with Locations((-23.5, -3.4)):
            Circle(SKETCH_2_3_R)
        with Locations((-8.5, -3.4)):
            Circle(SKETCH_2_3_R)
        with Locations((6.5, -3.4)):
            Circle(SKETCH_2_3_R)
    extrude(amount=-CUT_EXTRUDE_2_DEPTH, mode=Mode.SUBTRACT)

    # 草图5 → 切除-拉伸3 (cut)
    with BuildSketch(Plane(origin=(0, 0, 6), x_dir=(-1, 0, 0), z_dir=(0, 0, -1))):
        Polygon((22.403034489, -1.5), (24.596965511, -1.5), (25.693931023, -3.4), (24.596965511, -5.3), (22.403034489, -5.3), (21.306068977, -3.4), align=None)
        Polygon((6.306068977, -3.4), (7.403034489, -1.5), (9.596965511, -1.5), (10.693931023, -3.4), (9.596965511, -5.3), (7.403034489, -5.3), align=None)
        Polygon((-8.693931023, -3.4), (-7.596965511, -1.5), (-5.403034489, -1.5), (-4.306068977, -3.4), (-5.403034489, -5.3), (-7.596965511, -5.3), align=None)
    extrude(amount=-CUT_EXTRUDE_3_DEPTH, mode=Mode.SUBTRACT)

    # 草图1<7> → 凸台-拉伸4 (add)
    with SkipClean():  # the faces are left unmerged after this step: merging them gives an invalid solid
        with BuildSketch(Plane(origin=(0, 0, 0), x_dir=(1, 0, 0), z_dir=(0, 1, 0))):
            with Locations((24, 0)):
                Rectangle(SKETCH_1_7_W, SKETCH_1_7_H)
            with Locations(Location((24, 0, 0), (0, 0, 270))):
                Circle(SKETCH_1_7_R, mode=Mode.SUBTRACT)
            with Locations(Location((27.5, 0, 0), (0, 0, 270))):
                Circle(SKETCH_1_7_R_2, mode=Mode.SUBTRACT)
            with Locations(Location((24, -3.5, 0), (0, 0, 270))):
                Circle(SKETCH_1_7_R_2, mode=Mode.SUBTRACT)
            with Locations(Location((20.5, 0, 0), (0, 0, 270))):
                Circle(SKETCH_1_7_R_2, mode=Mode.SUBTRACT)
            with Locations(Location((24, 3.5, 0), (0, 0, 270))):
                Circle(SKETCH_1_7_R_2, mode=Mode.SUBTRACT)
        extrude(amount=EXTRUDE_4_DEPTH)

    # 草图1<8> → 切除-拉伸4 (cut)
    with SkipClean():  # the faces are left unmerged after this step: merging them gives an invalid solid
        with BuildSketch(Plane(origin=(0, 0, 0), x_dir=(1, 0, 0), z_dir=(0, 1, 0))):
            with Locations(Location((24, 0, 0), (0, 0, 270))):
                Circle(SKETCH_1_8_R)
            with Locations(Location((24, 0, 0), (0, 0, 270))):
                Circle(SKETCH_1_8_R_2, mode=Mode.SUBTRACT)
            with Locations(Location((27.5, 0, 0), (0, 0, 270))):
                Circle(SKETCH_1_8_R_3, mode=Mode.SUBTRACT)
            with Locations(Location((24, -3.5, 0), (0, 0, 270))):
                Circle(SKETCH_1_8_R_3, mode=Mode.SUBTRACT)
            with Locations(Location((20.5, 0, 0), (0, 0, 270))):
                Circle(SKETCH_1_8_R_3, mode=Mode.SUBTRACT)
            with Locations(Location((24, 3.5, 0), (0, 0, 270))):
                Circle(SKETCH_1_8_R_3, mode=Mode.SUBTRACT)
        extrude(amount=CUT_EXTRUDE_4_DEPTH, mode=Mode.SUBTRACT)

    # 草图6 → 切除-拉伸5 (cut)
    with BuildSketch(Plane(origin=(0, 0, -7.5), x_dir=(-1, 0, 0), z_dir=(0, 0, -1))):
        Polygon((-16.5, 2), (-18.5, 4), (-16.5, 4), align=None)
    extrude(amount=-CUT_EXTRUDE_5_DEPTH, mode=Mode.SUBTRACT)

    # 草图8 → 凸台-拉伸5 (add)
    with SkipClean():  # the faces are left unmerged after this step: merging them gives an invalid solid
        with BuildSketch(Plane.XZ.offset(EXTRUDE_START)):
            with Locations(Location((8, 0, 0), (0, 0, 90))):
                Circle(SKETCH_8_R)
            with Locations(Location((8, 0, 0), (0, 0, 270))):
                Circle(SKETCH_8_R_2, mode=Mode.SUBTRACT)
        extrude(amount=-EXTRUDE_5_DEPTH)


solid = part.part
